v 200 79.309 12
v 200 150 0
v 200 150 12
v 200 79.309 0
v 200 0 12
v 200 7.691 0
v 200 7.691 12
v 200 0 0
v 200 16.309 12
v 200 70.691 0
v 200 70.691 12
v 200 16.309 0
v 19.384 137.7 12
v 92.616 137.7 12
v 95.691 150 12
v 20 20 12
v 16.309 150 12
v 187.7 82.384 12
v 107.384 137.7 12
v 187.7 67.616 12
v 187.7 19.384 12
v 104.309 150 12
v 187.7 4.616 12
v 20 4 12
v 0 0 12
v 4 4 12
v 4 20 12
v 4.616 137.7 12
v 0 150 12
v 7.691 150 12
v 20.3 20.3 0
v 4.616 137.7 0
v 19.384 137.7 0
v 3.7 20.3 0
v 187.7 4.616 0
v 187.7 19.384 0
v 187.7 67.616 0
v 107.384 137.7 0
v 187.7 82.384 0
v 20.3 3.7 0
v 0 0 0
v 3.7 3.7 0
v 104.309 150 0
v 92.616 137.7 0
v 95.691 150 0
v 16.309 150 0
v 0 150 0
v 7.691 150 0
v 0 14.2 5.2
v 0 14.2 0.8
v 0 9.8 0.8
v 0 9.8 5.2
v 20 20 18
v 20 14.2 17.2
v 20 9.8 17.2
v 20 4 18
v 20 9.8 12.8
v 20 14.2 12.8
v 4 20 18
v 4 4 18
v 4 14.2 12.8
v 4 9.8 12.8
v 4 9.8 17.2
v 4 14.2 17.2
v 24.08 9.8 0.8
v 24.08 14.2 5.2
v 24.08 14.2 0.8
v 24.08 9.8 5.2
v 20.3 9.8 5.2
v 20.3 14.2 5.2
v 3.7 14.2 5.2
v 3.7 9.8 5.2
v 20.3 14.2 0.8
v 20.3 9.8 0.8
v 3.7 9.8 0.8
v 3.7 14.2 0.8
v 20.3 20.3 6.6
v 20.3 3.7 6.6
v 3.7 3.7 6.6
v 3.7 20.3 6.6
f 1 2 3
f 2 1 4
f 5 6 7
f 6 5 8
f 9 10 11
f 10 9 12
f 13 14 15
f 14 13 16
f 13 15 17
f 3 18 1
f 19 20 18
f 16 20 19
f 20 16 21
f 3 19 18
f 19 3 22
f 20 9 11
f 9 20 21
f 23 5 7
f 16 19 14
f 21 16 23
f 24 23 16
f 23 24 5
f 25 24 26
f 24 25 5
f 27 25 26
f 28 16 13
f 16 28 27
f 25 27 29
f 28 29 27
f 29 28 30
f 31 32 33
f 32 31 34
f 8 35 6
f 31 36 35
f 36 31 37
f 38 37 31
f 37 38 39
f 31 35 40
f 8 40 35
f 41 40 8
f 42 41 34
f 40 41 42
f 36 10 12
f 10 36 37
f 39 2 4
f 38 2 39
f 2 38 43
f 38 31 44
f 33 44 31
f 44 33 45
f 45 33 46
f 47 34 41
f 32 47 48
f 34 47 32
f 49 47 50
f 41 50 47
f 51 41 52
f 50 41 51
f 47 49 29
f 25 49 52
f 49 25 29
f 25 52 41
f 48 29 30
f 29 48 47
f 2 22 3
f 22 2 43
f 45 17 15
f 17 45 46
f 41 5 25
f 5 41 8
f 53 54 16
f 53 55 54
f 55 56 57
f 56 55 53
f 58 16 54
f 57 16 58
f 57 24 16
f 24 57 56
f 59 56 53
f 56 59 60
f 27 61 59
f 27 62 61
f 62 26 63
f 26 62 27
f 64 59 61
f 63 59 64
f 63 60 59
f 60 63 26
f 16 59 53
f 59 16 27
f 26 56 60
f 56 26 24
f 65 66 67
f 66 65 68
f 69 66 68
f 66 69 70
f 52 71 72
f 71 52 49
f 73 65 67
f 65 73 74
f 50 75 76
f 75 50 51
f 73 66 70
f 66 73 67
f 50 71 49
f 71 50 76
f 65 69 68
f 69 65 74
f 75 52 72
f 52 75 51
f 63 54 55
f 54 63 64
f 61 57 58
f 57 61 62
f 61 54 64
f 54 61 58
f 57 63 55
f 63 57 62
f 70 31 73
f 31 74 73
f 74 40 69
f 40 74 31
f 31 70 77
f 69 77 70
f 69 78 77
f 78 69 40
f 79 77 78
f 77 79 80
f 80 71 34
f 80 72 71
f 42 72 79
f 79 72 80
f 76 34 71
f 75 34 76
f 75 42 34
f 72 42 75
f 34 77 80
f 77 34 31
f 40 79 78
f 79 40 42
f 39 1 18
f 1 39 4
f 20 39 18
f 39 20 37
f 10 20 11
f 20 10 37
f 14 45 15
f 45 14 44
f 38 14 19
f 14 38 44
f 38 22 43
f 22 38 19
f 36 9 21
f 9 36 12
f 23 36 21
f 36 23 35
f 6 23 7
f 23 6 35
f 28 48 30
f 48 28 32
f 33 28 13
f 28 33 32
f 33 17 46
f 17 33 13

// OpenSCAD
// Hallacaitor Rect 0.4 - MIT - Copyright (c) 2026 Ariel
// New architecture prototype. Units mm. Not physically or food-contact validated.
// All structural hardware printed. Optional razor and thread are purchased consumables.
use <hallacaitor.scad>
use <modular.scad>
part="rect_tile"; facets=48; $fn=facets; angle=70; travel=0; E=.02;
module xc(d,h){rotate([0,90,0])cylinder(d=d,h=h);}
module loc_stud(){translate([4,4,12])cube([16,16,6]);}
module corner_interface_cuts(){
 translate([3.7,3.7,-E])cube([16.6,16.6,6.62]);
 for(z=[3,15])translate([-E,9.8,z-2.2])cube([24.1,4.4,4.4]);
}
module frame_quarter(solid=false){difference(){union(){
 if(solid)cube([200,150,12]);else{cube([200,24,12]);cube([24,150,12]);}
 loc_stud();
 }
 corner_interface_cuts();
 translate([200,12,-E])linear_extrude(height=12.1)offset(delta=.3)bowtie_2d();
 translate([12,150,-E])rotate([0,0,90])linear_extrude(height=12.1)offset(delta=.3)bowtie_2d();
 if(solid){translate([200,75,-E])linear_extrude(height=12.1)offset(delta=.3)bowtie_2d();translate([100,150,-E])rotate([0,0,90])linear_extrude(height=12.1)offset(delta=.3)bowtie_2d();}
}}
module frame_assembly(solid=false){
 frame_quarter(solid);translate([400,0,0])mirror([1,0,0])frame_quarter(solid);
 translate([0,300,0])mirror([0,1,0])frame_quarter(solid);translate([400,300,0])mirror([1,0,0])mirror([0,1,0])frame_quarter(solid);
}
module frame_key(){linear_extrude(height=11.8)bowtie_2d();}
// Column seated on lower rim, retained at both ends by removable transverse pins.
module tower_post(){difference(){union(){cube([24,24,174]);translate([4,4,174])cube([16,16,6]);}
 translate([3.7,3.7,-E])cube([16.6,16.6,6.62]);
 for(z=[3,177])translate([-E,9.8,z-2.2])cube([24.1,4.4,4.4]);
}}
module tower_pin(){union(){translate([0,1.7,0])cube([30,3.6,3.6]);cube([3,7,7]);}}
module tower_pin_pose(z=15){translate([-3,8.5,z-1.8])tower_pin();}
module tower_frame(){color("#588963")frame_assembly(true);color("#8063a5")translate([0,0,186])frame_assembly(false);
 for(x=[0,376],y=[0,276]){color("#7b8c83")translate([x,y,12])tower_post();color("#d7a52c")translate([x,y,0])tower_pin_pose(15);color("#d7a52c")translate([x,y,0])tower_pin_pose(189);}}
// Short wings keep the complete open folding assembly inside 400 x 300 footprint.
module short_wing(){difference(){union(){
 translate([0,10,16])round_rect(190,60,4,4);
 for(x=[32,96,160]){translate([x,0,10])cube([22,15,10]);barrel(x,0,10,22);}
 translate([68,66,16])round_rect(54,19,4,4);
 hull(){side_disk(190.7,0,10,7,4);side_disk(190.7,22,10,6,4);}
 translate([174,10,10])cube([20.7,6,10]);}
 translate([190.6,0,10])xc(8.5,4.2);translate([190.6,22,10])xc(4.5,4.2);
 translate([78,74,-E])round_rect(34,6,2,20.1);
}}
module short_wing_pose(s=1,a=70){if(s==1)translate([0,64,10])rotate([a,0,0])translate([0,0,-10])short_wing();else translate([0,-64,10])mirror([0,1,0])rotate([a,0,0])translate([0,0,-10])short_wing();}
module rect_fold(a=70){color("#4e81a0")fold_base(50,64,[-30,0,30]);for(s=[-1,1]){color("#6e9eb8")short_wing_pose(s,a);color("#7b8c83")translate([-3,s*64,6.8])shaft_native();color("#ce776c")translate([205.5,s*64,2.1])lock_key();}}
// Rectangular dry doser: chamber is isolated from hopper before reaching discharge.
// 56 mm shuttle travel, two separated 22.6 mm ports. Manual return, no spring.
module dry_housing(){difference(){union(){cube([140,70,4]);translate([0,0,4])cube([140,14.6,24.6]);translate([0,55.4,4])cube([140,14.6,24.6]);}
 translate([74.7,23.7,-E])cube([22.6,22.6,4.1]);translate([96,51,1.8])cylinder(d=4.4,h=2.3);
}}
module dry_lid(){difference(){cube([140,70,6]);translate([18.7,23.7,-E])cube([22.6,22.6,6.1]);translate([96,51,-E])cylinder(d=4.4,h=6.1);}}
module dry_shuttle(cw=22){difference(){union(){cube([120,40,24]);translate([119.9,3,0])cube([10.1,34,24]);}
 translate([30-cw/2,20-cw/2,-E])cube([cw,cw,24.1]);hull(){translate([40,36,-E])cylinder(d=4.4,h=24.1);translate([96,36,-E])cylinder(d=4.4,h=24.1);}}}
module dry_hopper(){difference(){union(){cube([70,70,6]);translate([3,3,6])cube([64,64,96]);}
 hull(){translate([23.7,23.7,-E])cube([22.6,22.6,6.1]);translate([6,6,18])cube([58,58,84.1]);}
}}
module dry_guide_pin(){union(){cylinder(d=4,h=32.6);translate([0,0,32.5])cylinder(d=7,h=2.1);}}
module dry_lid_cap(){cube([70,70,4]);}
module dry_stop(){difference(){cube([16,70,8]);translate([3,14.3,-E])cube([13.1,41.4,8.1]);}}
module dry_doser(t=0){color("#8063a5")dry_housing();color("#a58ec2")translate([t,15,4.3])dry_shuttle();color("#8063a5")translate([0,0,28.6])dry_lid();color("#8063a5")translate([-5,0,34.6])dry_hopper();color("#7b8c83")translate([96,51,2])dry_guide_pin();}
// Rectangular piston cartridge for guiso: 60 x 50 internal section, large outlet.
// Does not claim dosing repeatability or jam-free flow with arbitrary chunks.
module guiso_body(){difference(){union(){cube([70,60,12]);translate([0,0,30])cube([70,60,90]);translate([-10,-10,30])cube([90,80,6]);hull(){translate([0,0,28])cube([70,60,3]);translate([12.5,7.5,0])cube([45,45,4]);}}
 translate([5,5,32])cube([60,50,90]);hull(){translate([5,5,30])cube([60,50,3]);translate([17.5,12.5,-E])cube([35,35,4]);}
 translate([-E,5,4])cube([70.1,50,4.6]);
}}
module guiso_gate(){union(){cube([90,48.8,4]);translate([89.9,4,0])cube([8,40.8,12]);}}
module guiso_piston(){union(){cube([59,49,6]);translate([19.5,14.5,5.9])cube([20,20,110]);translate([0,0,115.8])cube([59,49,6]);}}
module piston_stop(h=20){difference(){cube([30,30,h]);translate([4.7,4.7,-E])cube([20.6,20.6,h+.1]);}}
module guiso_doser(){color("#b96143")guiso_body();color("#d58e71")translate([-2,5.6,4.3])guiso_gate();color("#d58e71")translate([5.5,5.5,85])guiso_piston();}
// Open magazine for individually separated pepper strips; manual tray, no false count.
module strip_magazine(){difference(){cube([160,80,44]);for(x=[4,43,82,121]){translate([x,4,4])cube([35,72,40.1]);translate([x,-E,4])cube([35,4.1,36]);}}}
module strip_drawer(){union(){cube([33.8,72,4]);for(x=[0,31.8])translate([x,0,0])cube([2,72,8]);translate([0,70,0])cube([33.8,2,8]);translate([0,-16,0])cube([33.8,16.1,12]);}}
module strip_lid(){difference(){cube([164,84,5]);translate([1.7,1.7,-E])cube([160.6,80.6,3.4]);}}
// Vertical bobbin pods fit left/right of the folded hallaca. Active + reserve.
// Wound diameter <=72, flange76, wound width88. Capacity is material-dependent.
module spool_box(){difference(){union(){cube([90,120,6]);cube([4,120,114]);translate([86,0,0])cube([4,120,114]);translate([0,112,0])cube([90,8,114]);for(x=[0,74],y=[0,104])translate([x,y,100])cube([16,16,14]);}
 translate([45,60,-E])cylinder(d=10.6,h=6.1);for(x=[8,82],y=[8,112])translate([x,y,107.5])cylinder(d=4.6,h=6.6);}}
module spool_cover(){difference(){union(){cube([90,120,6]);for(x=[8,82],y=[8,112])translate([x,y,-6])cylinder(d=4,h=6.1);}for(x=[17,69])translate([x,56,-E])cylinder(d=3.4,h=6.1);}}
module spool_left(){difference(){union(){cylinder(d=76,h=4);translate([0,0,3.9])cylinder(d=26,h=44.1);translate([0,0,47.9])cylinder(d=20,h=8.1);}translate([0,0,-E])cylinder(d=10.6,h=56.1);}}
module spool_right(){difference(){union(){cylinder(d=76,h=4);translate([0,0,3.9])cylinder(d=26,h=44.1);}translate([0,0,-E])cylinder(d=10.6,h=48.1);translate([0,0,39.4])cylinder(d=20.6,h=8.7);}}
module spool_adapter(){difference(){cylinder(d=25,h=20);translate([0,0,-E])cylinder(d=10.6,h=20.1);}}
module spool_axle(){union(){cylinder(d=18,h=3);translate([0,0,2.9])cylinder(d=10,h=108.1);}}
module spool_washer(){difference(){cylinder(d=18,h=2);translate([0,0,-E])cylinder(d=10.6,h=2.1);}}
module spool_set(show_thread=true){color("#ce776c")spool_box();color("#d58e82")translate([0,0,114])spool_cover();color("#7b8c83")translate([45,60,-3])spool_axle();color("#7b8c83")translate([45,60,6])spool_washer();
 color("#7b8c83")translate([45,60,8])spool_left();color("#7b8c83")translate([45,60,104])rotate([180,0,0])spool_right();
 if(show_thread)color("#d6c7a4")translate([45,60,12.1])difference(){cylinder(d=72,h=87.8);translate([0,0,-E])cylinder(d=26.4,h=87.9);}
}
// Cutter uses a replaceable DE razor as an optional purchased consumable.
// 43 x 22 x 0.1 nominal, verify actual blade. Recess 43.6 x22.6; edge recessed 10 mm.
module cutter_base(){difference(){cube([62,42,7]);translate([9.2,9.7,6.65])cube([43.6,22.6,.4]);translate([29.8,-E,5.8])cube([2.4,12.1,1.3]);for(x=[5,57])translate([x,21,-E])cylinder(d=3.4,h=7.1);}}
module cutter_cover(){difference(){cube([62,42,7]);translate([29.8,-E,-E])cube([2.4,12.1,7.1]);for(x=[5,57])translate([x,21,-E])cylinder(d=3.4,h=7.1);}}
module cutter_clamp(){difference(){cube([10,48.6,18.6]);translate([-E,3,2])cube([10.1,42.6,14.6]);translate([5,24.3,-E])cylinder(d=3.4,h=18.7);}}
module cutter_pin(){union(){cylinder(d=3,h=18.6);translate([0,0,18.5])cylinder(d=6,h=2);}}
module cutter_mount_pin(){union(){cylinder(d=3,h=25.6);translate([0,0,25.5])cylinder(d=6,h=2);}}
module cutter_pedestal(){cube([40,36,3]);}
module blade_dummy(){cube([43,22,.2]);}
module cutter_set(show_blade=false,mount=false){color("#ce776c")cutter_base();color("#d58e82")translate([0,0,7])cutter_cover();for(x=[0,52]){color("#7b8c83")translate([x,-3.3,-2.3])cutter_clamp();color("#7b8c83")translate([x+5,21,mount?-9.2:-2.2])if(mount)cutter_mount_pin();else cutter_pin();}if(show_blade)color("silver")translate([9.5,10,6.8])cube([43,22,.1]);}
// Bridge rails cross the frame; split halves share a sleeved center overlap.
module bridge_half(){cube([200,36,12]);}
module bridge_joiner(){difference(){cube([60,44.6,16]);translate([-E,4,4])cube([60.1,36.6,12.1]);}}
module bridge_dry_front(){difference(){bridge_half();translate([119.6,18.6,-E])cube([22.8,22.8,12.1]);}}
module bridge_dry_back(){difference(){bridge_half();translate([89.6,-1.4,-E])cube([22.8,22.8,12.1]);}}
module guiso_mount(){difference(){union(){translate([0,0,48])cube([100,100,8]);for(x=[0,88],y=[0,88])translate([x,y,0])cube([12,12,48.1]);}translate([14.7,19.7,47.9])cube([70.6,60.6,8.2]);}}
module funnel_body(){union(){translate([0,-4,67])cube([240,4.1,3]);difference(){hull(){translate([0,0,67])cube([240,240,3]);translate([92.5,92.5,0])cube([55,55,3]);}hull(){translate([3,3,67])cube([234,234,3.1]);translate([95.5,95.5,-E])cube([49,49,3.1]);}}}}
module funnel_quarter(){intersection(){funnel_body();translate([0,-4,-E])cube([120,124,71]);}}
module funnel_assembly(){funnel_quarter();translate([240,0,0])mirror([1,0,0])funnel_quarter();translate([0,240,0])mirror([0,1,0])funnel_quarter();translate([240,240,0])mirror([1,0,0])mirror([0,1,0])funnel_quarter();}
module funnel_hanger(){union(){cube([20,9,4]);cube([20,4,25]);translate([0,0,21])cube([20,59,4]);}}
module all_funnel_hangers(){for(x=[185,300])translate([x,21,189])funnel_hanger();for(x=[90,195])translate([x+20,279,189])rotate([0,0,180])funnel_hanger();}
module funnel_clip(){difference(){cube([30,9.6,14]);translate([-E,3,2])cube([30.1,3.6,12.1]);}}
module station_hub(){tower_frame();
 translate([100,150,12])rect_fold(angle);
 translate([0,90,12])spool_set();translate([310,90,12])spool_set();translate([333,128,132])cutter_pedestal();translate([322,125,135])cutter_set(true,true);
 color("#8063a5")translate([80,30,126])funnel_assembly();
 color("#7b8c83")translate([150,100,210])guiso_mount();translate([165,120,236])guiso_doser();
 color("#7b8c83"){for(x=[185,300])translate([x,21,189])funnel_hanger();for(x=[90,195])translate([x+20,279,189])rotate([0,0,180])funnel_hanger();for(y=[40,88,176,220])translate([170,y-4.3,194])bridge_joiner();}
 translate([45,35,210])dry_doser(travel);translate([215,195,210])dry_doser(travel);
 color("#8063a5"){
 translate([0,40,198])bridge_dry_front();translate([200,40,198])bridge_half();
 for(y=[88,176],x=[0,200])translate([x,y,198])bridge_half();
 translate([0,220,198])bridge_half();translate([200,220,198])bridge_dry_back();
 }
}
module station_twine(){color("#ce776c")frame_assembly(true);translate([0,90,12])spool_set();translate([310,90,12])spool_set();translate([333,128,132])cutter_pedestal();translate([322,125,135])cutter_set(true,true);color("#ce776c")translate([100,85,12])family_tie();}
if(part=="hub")station_hub();else if(part=="twine_station")station_twine();else if(part=="dry_assembly")dry_doser(travel);else if(part=="guiso_assembly")guiso_doser();else if(part=="cutter_assembly")cutter_set(true);else if(part=="spool_assembly")spool_set();else if(part=="fold_assembly")rect_fold(angle);
else if(part=="rect_tile")frame_quarter(true);else if(part=="rect_frame")frame_quarter();else if(part=="rect_key")frame_key();else if(part=="tower_post")tower_post();else if(part=="tower_pin")tower_pin();
else if(part=="short_wing_north")translate([0,85,20])rotate([180,0,0])short_wing();else if(part=="short_wing_south")translate([0,7,20])rotate([180,0,0])mirror([0,1,0])short_wing();
else if(part=="dry_housing")dry_housing();else if(part=="dry_lid")dry_lid();else if(part=="dry_shuttle")dry_shuttle();else if(part=="dry_shuttle_small")dry_shuttle(14);else if(part=="dry_hopper")dry_hopper();else if(part=="dry_lid_cap")dry_lid_cap();else if(part=="dry_guide_pin")dry_guide_pin();
else if(part=="guiso_body")guiso_body();else if(part=="guiso_gate")guiso_gate();else if(part=="guiso_piston")guiso_piston();else if(part=="piston_stop_20")piston_stop(20);else if(part=="piston_stop_13")piston_stop(13.3333);else if(part=="strip_drawer")strip_drawer();else if(part=="strip_magazine")strip_magazine();else if(part=="strip_lid")translate([164,0,5])rotate([0,180,0])strip_lid();
else if(part=="spool_box")spool_box();else if(part=="spool_left")spool_left();else if(part=="spool_right")spool_right();else if(part=="spool_adapter")spool_adapter();else if(part=="spool_axle")spool_axle();else if(part=="spool_cover")translate([90,0,6])rotate([0,180,0])spool_cover();else if(part=="spool_washer")spool_washer();
else if(part=="cutter_base")cutter_base();else if(part=="cutter_cover")cutter_cover();else if(part=="cutter_clamp")cutter_clamp();else if(part=="cutter_pin")cutter_pin();else if(part=="cutter_mount_pin")cutter_mount_pin();else if(part=="cutter_pedestal")cutter_pedestal();else if(part=="blade_dummy")blade_dummy();else if(part=="bridge_half")bridge_half();else if(part=="bridge_joiner")bridge_joiner();else if(part=="bridge_dry_front")bridge_dry_front();else if(part=="bridge_dry_back")bridge_dry_back();else if(part=="guiso_mount")guiso_mount();else if(part=="funnel_quarter")translate([0,0,70])rotate([180,0,0])funnel_quarter();else if(part=="funnel_clip")funnel_clip();else if(part=="funnel_hanger")funnel_hanger();
else if(part=="check_fold_pods")intersection(){translate([100,150,12])rect_fold(angle);union(){translate([0,90,12])spool_box();translate([310,90,12])spool_box();}}
else if(part=="check_fold_funnel")intersection(){translate([100,150,12])rect_fold(angle);translate([80,30,126])funnel_assembly();}
else if(part=="check_bridge_funnel")intersection(){translate([80,30,126])funnel_assembly();for(y=[40,88,176,220],x=[0,200])translate([x,y,198])bridge_half();}
else if(part=="check_cutter_mount")intersection(){translate([310,90,126])spool_cover();translate([322,125,135])cutter_set();}
else if(part=="check_column_frame")intersection(){frame_quarter();translate([0,0,12])tower_post();}
else if(part=="check_column_upper")intersection(){translate([0,0,12])tower_post();translate([0,0,186])frame_quarter();}
else if(part=="check_lock_pin")intersection(){union(){frame_quarter();translate([0,0,12])tower_post();}tower_pin_pose();}
else if(part=="check_dry_shuttle")intersection(){union(){dry_housing();translate([0,0,28.6])dry_lid();}translate([travel,15,4.3])dry_shuttle();}
else if(part=="check_guiso_gate")intersection(){guiso_body();translate([-2,5.6,4.3])guiso_gate();}
else if(part=="check_spool_coupling")intersection(){spool_left();translate([0,0,96])rotate([180,0,0])spool_right();}
else if(part=="check_spool_box")intersection(){spool_box();union(){translate([45,60,8])spool_left();translate([45,60,104])rotate([180,0,0])spool_right();}}
else if(part=="check_guiso_mount")intersection(){translate([150,100,210])guiso_mount();translate([165,120,236])guiso_body();}
else if(part=="check_funnel_hangers")intersection(){translate([80,30,126])funnel_assembly();all_funnel_hangers();}
else if(part=="check_hangers_dosers")intersection(){all_funnel_hangers();union(){translate([45,35,210])dry_doser(travel);translate([215,195,210])dry_doser(travel);}}
else if(part=="check_dry_pin")intersection(){translate([travel,15,4.3])dry_shuttle();translate([96,51,2])dry_guide_pin();}
else if(part=="check_cutter_clamps")intersection(){union(){cutter_base();translate([0,0,7])cutter_cover();}for(x=[0,52])translate([x,-3.3,-2.3])cutter_clamp();}
else if(part=="check_short_base")intersection(){fold_base(50,64,[-30,0,30]);short_wing_pose(1,angle);}
else if(part=="check_short_wings")intersection(){short_wing_pose(1,angle);short_wing_pose(-1,angle);}
else assert(false,str("Unknown Rect part: ",part));
